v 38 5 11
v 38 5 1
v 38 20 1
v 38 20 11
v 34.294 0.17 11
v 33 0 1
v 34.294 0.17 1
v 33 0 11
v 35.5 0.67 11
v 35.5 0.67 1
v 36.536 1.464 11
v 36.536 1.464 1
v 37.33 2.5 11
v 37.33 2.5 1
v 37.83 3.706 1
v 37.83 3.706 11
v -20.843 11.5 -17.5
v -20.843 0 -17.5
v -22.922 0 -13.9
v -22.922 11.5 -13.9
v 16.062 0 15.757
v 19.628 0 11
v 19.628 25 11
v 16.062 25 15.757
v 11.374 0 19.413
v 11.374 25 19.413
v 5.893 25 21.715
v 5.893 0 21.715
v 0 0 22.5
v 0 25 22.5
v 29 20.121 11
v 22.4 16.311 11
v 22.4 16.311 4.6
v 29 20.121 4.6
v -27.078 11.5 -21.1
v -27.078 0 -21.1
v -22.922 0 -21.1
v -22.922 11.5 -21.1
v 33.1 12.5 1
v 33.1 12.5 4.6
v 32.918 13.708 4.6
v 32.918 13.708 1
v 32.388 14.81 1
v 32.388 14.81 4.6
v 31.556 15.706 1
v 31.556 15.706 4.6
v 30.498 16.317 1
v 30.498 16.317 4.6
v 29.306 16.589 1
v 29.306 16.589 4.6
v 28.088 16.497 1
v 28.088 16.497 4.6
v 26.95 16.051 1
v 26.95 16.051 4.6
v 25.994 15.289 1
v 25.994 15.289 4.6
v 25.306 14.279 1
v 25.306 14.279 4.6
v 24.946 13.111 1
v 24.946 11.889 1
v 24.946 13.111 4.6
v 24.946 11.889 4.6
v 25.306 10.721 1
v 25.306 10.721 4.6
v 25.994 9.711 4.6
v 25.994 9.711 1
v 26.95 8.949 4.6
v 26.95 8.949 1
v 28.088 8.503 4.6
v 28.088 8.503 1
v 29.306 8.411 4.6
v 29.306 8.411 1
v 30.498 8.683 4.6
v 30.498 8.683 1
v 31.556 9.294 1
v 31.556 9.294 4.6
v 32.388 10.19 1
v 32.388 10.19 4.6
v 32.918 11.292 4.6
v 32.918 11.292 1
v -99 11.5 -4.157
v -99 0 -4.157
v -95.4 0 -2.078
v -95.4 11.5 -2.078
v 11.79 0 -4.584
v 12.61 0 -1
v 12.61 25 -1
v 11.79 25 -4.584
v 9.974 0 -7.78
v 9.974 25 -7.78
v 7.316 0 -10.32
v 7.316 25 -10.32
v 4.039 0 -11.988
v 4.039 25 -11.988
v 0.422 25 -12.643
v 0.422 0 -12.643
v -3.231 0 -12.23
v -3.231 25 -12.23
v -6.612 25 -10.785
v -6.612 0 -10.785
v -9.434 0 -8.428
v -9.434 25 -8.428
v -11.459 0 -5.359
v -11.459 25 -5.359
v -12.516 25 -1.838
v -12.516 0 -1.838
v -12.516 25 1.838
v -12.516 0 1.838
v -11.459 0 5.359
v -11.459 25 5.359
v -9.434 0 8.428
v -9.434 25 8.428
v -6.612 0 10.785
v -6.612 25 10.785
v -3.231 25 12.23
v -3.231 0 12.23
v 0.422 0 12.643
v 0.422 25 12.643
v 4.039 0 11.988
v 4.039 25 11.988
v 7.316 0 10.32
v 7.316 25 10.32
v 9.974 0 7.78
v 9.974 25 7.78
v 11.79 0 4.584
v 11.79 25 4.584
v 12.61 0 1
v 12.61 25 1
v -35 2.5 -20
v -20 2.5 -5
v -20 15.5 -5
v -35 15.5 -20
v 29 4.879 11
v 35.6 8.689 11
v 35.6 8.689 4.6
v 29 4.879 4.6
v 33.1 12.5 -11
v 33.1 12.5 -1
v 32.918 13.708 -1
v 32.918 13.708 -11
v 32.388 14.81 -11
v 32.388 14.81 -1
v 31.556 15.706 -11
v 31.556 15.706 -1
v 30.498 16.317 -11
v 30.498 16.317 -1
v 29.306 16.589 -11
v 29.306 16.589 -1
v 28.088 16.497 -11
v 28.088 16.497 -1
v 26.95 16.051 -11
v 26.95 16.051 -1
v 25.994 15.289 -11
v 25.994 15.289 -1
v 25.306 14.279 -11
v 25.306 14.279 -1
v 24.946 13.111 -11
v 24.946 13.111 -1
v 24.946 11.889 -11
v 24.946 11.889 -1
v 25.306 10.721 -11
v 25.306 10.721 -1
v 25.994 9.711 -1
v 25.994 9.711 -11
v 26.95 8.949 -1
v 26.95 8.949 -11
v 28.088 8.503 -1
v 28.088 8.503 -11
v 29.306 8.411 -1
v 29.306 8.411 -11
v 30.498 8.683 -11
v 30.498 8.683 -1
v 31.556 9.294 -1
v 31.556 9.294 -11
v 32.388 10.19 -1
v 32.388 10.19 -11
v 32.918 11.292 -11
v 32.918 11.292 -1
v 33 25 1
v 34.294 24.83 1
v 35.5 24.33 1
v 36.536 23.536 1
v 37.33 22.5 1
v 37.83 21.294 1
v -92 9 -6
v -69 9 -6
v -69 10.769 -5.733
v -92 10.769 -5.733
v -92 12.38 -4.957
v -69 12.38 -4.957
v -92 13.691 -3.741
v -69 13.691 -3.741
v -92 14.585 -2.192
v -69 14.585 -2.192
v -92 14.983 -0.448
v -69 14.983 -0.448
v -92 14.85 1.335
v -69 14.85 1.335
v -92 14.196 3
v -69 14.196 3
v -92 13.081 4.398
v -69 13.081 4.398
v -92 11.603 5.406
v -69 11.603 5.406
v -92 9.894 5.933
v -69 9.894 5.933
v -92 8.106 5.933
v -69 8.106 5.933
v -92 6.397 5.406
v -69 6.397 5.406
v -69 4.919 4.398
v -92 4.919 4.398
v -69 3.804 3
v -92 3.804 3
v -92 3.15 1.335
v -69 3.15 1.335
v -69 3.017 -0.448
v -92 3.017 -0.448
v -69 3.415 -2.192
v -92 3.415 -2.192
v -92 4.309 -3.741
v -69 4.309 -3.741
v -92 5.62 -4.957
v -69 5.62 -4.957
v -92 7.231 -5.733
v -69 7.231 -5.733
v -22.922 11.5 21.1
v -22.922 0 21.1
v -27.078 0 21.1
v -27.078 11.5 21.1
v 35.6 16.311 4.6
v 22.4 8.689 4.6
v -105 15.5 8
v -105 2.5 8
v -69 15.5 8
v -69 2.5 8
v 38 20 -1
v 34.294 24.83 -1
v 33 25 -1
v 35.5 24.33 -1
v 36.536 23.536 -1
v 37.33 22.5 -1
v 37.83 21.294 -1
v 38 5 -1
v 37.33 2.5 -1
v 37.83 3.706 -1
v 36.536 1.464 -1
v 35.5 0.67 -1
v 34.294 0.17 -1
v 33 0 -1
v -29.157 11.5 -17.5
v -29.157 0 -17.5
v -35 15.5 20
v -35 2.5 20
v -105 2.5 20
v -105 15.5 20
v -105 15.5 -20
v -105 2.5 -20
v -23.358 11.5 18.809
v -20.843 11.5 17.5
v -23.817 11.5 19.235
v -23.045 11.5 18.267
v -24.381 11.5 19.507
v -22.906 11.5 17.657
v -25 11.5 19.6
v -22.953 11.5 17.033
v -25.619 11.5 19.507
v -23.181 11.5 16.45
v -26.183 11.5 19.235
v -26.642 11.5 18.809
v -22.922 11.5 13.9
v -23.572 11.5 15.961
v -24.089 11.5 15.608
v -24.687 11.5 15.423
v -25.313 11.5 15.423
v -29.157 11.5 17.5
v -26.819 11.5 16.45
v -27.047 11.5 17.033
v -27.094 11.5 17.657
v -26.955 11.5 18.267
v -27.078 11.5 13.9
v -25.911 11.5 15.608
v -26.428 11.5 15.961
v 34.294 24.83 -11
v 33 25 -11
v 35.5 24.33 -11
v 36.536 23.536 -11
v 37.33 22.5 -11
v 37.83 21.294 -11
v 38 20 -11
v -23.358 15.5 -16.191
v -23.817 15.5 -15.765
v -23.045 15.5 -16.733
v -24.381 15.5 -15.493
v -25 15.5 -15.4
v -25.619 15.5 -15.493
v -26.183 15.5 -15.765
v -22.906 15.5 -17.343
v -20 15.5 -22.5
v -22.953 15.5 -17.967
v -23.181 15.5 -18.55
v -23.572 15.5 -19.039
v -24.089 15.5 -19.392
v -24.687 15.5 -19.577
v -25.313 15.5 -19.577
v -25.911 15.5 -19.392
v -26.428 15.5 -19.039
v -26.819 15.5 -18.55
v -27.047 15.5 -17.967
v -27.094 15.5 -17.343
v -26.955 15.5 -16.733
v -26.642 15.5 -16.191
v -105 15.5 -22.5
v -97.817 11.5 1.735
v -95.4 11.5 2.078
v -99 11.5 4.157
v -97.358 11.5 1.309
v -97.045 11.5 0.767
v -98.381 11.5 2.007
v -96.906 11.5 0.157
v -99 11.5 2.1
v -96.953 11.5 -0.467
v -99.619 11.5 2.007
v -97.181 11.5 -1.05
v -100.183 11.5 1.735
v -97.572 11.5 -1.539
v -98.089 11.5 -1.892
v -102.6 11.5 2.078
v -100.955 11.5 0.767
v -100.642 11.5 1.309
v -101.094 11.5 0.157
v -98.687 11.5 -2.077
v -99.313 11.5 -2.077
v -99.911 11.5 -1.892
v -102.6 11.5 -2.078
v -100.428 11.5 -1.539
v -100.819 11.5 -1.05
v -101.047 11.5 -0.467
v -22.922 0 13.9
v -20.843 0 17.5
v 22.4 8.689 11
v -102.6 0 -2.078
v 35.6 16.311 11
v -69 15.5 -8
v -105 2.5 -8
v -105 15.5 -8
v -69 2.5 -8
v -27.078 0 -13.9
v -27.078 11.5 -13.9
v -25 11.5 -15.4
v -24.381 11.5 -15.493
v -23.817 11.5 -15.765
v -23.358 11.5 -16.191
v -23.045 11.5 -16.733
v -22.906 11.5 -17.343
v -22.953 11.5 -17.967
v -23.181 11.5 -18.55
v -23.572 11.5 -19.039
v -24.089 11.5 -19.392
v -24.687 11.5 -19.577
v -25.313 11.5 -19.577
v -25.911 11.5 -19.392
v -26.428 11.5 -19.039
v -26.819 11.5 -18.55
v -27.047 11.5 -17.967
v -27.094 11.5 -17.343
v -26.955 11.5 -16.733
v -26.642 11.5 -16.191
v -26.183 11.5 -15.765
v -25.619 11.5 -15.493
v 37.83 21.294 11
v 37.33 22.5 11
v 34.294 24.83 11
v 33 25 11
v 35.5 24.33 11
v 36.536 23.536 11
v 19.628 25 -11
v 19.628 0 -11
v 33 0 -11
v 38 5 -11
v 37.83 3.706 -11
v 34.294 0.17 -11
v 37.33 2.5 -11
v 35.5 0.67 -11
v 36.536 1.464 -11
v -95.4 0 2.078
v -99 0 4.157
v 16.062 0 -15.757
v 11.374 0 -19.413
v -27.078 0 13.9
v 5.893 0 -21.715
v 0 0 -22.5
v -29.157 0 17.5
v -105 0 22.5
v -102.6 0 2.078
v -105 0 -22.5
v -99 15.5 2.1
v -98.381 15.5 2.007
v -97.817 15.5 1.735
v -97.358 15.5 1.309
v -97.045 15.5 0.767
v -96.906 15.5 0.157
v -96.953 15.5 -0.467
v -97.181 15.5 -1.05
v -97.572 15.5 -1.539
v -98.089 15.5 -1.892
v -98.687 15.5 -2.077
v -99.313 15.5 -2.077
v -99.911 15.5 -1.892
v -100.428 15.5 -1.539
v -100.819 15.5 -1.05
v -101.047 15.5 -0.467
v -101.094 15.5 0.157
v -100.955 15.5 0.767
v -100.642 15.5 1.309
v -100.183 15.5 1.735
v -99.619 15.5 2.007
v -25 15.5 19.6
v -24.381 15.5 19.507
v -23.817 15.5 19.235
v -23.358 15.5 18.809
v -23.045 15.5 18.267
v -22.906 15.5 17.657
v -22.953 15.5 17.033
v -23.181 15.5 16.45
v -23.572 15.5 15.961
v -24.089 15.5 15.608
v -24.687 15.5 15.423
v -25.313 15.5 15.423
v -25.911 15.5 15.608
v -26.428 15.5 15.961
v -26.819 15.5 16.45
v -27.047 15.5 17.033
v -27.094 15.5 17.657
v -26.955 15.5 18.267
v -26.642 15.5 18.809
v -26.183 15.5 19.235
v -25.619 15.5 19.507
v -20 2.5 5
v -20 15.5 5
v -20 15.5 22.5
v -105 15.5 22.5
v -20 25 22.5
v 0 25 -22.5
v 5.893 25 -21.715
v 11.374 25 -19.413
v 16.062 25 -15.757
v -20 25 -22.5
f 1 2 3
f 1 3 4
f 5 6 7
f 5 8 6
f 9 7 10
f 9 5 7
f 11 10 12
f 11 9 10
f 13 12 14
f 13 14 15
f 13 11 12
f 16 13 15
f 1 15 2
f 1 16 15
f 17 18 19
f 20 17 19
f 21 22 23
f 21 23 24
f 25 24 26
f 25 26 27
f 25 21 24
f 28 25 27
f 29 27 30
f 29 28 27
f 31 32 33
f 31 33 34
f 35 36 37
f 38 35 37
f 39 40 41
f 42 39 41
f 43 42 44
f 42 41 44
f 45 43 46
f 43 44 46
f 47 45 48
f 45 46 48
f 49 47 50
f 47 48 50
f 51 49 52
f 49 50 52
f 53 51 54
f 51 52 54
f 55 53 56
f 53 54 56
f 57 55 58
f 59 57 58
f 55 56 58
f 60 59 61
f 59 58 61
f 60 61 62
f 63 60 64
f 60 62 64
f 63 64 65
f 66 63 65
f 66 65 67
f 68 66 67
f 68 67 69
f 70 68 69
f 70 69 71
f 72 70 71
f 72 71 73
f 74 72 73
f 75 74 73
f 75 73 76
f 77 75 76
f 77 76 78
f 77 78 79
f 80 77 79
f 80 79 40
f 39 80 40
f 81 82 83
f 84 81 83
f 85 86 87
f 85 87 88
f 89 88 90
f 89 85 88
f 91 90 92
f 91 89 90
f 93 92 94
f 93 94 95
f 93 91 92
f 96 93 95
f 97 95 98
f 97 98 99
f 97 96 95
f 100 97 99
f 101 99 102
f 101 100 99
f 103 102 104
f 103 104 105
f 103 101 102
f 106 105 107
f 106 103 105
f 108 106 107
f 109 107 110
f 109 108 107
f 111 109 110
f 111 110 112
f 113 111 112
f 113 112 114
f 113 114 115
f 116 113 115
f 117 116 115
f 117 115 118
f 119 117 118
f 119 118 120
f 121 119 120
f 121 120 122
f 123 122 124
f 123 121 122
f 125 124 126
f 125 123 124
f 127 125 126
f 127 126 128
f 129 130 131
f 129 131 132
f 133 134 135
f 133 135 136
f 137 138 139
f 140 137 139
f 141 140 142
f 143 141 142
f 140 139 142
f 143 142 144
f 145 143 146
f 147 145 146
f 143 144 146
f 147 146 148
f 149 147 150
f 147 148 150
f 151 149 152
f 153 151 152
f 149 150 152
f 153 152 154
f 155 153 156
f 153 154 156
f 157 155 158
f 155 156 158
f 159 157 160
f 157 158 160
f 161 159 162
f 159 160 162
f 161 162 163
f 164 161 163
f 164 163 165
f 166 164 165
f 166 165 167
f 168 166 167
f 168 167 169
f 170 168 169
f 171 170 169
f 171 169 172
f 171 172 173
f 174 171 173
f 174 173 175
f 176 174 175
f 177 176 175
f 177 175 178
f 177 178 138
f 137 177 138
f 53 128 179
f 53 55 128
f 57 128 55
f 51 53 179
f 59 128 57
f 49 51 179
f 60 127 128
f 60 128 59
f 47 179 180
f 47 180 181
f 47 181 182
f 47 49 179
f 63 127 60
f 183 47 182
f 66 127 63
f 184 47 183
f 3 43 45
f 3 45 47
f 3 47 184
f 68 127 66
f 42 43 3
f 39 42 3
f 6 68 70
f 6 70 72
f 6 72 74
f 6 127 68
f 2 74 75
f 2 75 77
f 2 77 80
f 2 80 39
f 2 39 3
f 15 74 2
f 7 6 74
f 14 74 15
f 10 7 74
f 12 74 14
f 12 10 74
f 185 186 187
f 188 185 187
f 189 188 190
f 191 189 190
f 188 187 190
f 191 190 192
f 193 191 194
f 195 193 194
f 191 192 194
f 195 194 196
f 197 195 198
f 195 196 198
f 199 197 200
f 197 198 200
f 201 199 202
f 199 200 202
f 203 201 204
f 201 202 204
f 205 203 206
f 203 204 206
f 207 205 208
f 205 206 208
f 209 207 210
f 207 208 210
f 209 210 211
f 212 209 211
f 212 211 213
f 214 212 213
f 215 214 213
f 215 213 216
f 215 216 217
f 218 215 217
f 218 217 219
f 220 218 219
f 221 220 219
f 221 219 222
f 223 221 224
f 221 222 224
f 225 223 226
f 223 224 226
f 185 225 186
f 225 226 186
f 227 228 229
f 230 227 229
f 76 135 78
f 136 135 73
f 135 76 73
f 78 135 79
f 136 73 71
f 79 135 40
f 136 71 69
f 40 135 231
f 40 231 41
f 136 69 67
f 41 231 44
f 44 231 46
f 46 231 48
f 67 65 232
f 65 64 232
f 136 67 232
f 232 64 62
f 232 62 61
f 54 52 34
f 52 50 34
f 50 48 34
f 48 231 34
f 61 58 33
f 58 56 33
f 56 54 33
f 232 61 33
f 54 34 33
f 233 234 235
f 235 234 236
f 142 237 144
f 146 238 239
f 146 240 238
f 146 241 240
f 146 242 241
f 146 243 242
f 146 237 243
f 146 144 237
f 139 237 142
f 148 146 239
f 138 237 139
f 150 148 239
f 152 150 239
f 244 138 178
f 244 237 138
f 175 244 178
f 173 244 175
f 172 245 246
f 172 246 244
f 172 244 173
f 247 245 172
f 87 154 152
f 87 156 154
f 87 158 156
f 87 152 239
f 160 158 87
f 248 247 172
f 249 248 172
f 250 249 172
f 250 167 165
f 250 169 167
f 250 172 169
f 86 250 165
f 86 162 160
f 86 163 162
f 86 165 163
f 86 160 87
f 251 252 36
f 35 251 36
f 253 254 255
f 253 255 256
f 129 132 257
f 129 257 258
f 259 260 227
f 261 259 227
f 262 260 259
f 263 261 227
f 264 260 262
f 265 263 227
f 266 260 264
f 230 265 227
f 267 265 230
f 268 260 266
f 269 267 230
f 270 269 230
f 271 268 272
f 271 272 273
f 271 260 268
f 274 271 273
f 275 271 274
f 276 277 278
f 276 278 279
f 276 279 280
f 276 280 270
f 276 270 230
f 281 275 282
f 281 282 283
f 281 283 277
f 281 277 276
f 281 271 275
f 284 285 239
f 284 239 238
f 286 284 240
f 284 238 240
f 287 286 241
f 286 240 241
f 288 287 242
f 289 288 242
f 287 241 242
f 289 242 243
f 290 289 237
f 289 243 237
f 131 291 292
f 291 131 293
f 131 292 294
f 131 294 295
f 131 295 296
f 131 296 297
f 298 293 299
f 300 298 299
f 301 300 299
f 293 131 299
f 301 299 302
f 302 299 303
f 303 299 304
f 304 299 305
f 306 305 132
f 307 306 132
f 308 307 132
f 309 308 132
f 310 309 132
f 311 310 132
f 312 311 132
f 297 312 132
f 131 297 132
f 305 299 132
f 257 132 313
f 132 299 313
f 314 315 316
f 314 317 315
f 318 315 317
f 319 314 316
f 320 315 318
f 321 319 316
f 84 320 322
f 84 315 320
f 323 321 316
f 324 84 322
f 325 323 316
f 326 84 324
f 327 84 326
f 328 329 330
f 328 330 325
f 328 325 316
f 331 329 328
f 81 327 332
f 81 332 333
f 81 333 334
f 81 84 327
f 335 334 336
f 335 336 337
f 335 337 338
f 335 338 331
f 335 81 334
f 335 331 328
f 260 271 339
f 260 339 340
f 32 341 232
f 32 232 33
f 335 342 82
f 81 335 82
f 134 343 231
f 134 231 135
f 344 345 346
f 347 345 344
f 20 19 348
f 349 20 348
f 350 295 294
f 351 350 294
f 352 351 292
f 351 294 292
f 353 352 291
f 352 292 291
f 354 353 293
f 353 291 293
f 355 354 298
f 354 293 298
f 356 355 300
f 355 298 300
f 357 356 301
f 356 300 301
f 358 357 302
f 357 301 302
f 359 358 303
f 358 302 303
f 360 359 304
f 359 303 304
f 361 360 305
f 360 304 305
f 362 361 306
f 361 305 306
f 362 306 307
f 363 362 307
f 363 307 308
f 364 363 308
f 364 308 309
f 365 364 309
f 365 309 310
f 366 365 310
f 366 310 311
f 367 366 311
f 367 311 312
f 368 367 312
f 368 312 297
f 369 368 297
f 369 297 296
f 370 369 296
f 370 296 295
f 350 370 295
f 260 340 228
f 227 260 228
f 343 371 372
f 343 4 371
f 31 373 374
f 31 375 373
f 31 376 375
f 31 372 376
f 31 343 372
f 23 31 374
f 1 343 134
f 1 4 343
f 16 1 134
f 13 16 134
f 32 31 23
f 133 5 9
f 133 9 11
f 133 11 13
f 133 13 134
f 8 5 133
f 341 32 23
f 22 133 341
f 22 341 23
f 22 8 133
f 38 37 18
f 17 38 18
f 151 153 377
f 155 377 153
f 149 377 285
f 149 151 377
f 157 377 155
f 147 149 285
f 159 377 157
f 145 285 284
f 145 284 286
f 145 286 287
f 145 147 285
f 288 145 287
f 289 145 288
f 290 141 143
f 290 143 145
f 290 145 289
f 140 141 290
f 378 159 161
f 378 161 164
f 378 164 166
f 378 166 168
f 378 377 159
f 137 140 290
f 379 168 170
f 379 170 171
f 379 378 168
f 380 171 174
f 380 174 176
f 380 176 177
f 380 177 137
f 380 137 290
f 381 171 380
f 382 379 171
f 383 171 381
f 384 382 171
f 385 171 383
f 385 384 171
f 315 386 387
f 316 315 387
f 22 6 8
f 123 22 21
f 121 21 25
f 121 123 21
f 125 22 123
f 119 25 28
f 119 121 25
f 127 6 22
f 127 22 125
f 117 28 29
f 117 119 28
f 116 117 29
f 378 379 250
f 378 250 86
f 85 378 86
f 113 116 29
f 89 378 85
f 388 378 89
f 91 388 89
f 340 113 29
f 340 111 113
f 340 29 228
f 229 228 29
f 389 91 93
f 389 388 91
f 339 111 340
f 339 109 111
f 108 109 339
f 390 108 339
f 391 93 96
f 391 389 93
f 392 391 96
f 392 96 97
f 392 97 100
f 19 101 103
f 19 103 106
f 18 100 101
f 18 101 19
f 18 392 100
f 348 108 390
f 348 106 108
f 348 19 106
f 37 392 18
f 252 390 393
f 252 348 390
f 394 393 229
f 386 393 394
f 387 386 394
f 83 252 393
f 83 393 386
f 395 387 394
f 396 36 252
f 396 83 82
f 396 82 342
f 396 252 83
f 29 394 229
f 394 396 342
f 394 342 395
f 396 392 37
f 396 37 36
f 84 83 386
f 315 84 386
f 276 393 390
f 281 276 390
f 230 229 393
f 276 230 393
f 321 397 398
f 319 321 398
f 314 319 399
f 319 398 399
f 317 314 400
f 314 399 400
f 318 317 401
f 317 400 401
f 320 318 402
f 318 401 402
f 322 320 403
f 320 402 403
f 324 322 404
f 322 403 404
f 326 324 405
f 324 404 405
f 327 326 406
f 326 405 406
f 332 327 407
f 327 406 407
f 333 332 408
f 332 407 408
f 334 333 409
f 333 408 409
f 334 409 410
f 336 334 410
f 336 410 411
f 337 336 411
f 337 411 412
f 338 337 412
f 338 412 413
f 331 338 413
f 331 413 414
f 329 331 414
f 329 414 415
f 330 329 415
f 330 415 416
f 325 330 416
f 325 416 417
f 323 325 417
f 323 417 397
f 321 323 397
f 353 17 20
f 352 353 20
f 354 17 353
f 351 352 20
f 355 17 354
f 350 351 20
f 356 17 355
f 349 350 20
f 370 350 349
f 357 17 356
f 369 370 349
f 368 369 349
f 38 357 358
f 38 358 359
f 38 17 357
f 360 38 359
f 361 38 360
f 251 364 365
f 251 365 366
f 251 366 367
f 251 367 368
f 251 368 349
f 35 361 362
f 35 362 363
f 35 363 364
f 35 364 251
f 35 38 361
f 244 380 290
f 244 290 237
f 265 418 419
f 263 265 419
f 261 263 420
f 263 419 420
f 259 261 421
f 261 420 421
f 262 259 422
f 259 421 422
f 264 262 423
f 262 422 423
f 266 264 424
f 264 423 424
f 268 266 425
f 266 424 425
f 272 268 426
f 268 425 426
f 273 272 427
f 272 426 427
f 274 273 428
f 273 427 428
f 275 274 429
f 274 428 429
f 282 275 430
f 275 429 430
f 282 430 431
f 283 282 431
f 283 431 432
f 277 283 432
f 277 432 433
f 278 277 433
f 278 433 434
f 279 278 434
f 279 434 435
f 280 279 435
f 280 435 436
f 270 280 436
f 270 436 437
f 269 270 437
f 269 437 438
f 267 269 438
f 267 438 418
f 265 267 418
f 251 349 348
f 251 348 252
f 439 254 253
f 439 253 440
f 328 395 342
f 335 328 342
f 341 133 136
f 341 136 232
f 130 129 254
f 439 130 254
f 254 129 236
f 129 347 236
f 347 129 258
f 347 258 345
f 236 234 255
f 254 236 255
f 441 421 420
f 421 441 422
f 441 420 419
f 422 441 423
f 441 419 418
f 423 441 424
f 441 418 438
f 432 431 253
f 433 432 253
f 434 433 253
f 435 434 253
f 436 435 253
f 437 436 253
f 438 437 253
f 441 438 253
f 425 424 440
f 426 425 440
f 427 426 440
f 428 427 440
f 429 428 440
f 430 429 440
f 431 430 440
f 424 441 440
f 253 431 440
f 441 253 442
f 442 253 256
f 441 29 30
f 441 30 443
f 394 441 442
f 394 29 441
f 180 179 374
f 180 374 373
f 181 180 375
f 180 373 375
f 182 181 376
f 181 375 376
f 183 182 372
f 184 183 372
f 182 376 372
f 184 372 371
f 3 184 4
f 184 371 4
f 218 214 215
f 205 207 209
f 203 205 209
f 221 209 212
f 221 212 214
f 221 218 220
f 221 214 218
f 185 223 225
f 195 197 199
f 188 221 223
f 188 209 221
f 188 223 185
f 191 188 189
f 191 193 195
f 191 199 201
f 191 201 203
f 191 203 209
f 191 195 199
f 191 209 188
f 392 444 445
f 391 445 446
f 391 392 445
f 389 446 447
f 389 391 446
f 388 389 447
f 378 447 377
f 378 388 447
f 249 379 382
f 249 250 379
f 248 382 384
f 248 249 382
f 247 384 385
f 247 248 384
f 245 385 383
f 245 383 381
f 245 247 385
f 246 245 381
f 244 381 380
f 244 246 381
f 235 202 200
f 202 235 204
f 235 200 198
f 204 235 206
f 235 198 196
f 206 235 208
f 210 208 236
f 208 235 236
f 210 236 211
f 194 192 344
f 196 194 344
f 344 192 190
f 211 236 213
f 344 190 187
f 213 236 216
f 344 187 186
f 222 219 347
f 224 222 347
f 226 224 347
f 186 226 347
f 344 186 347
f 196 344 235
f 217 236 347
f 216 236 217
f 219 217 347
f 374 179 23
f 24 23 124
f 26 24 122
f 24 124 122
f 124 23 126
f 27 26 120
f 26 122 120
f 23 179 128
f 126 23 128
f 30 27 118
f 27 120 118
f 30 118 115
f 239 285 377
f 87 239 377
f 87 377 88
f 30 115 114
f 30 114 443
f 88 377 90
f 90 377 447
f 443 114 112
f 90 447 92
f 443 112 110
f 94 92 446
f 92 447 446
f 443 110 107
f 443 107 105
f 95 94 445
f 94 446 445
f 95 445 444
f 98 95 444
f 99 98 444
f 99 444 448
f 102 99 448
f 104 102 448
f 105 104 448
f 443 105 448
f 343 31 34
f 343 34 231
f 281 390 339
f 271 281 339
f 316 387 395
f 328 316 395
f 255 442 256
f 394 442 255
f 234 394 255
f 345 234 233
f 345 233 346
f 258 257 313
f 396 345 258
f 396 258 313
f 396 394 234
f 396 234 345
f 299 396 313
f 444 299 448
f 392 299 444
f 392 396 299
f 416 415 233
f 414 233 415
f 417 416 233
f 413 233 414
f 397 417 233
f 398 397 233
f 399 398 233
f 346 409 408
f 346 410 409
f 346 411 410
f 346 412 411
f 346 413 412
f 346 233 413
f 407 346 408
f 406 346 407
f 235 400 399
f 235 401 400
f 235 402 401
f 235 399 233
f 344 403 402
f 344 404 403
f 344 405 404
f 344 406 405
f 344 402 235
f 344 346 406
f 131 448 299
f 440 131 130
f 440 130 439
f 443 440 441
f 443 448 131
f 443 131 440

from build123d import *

# Parameters (mm, degrees)
BOSS_EXTRUDE1_DEPTH = 25
CUT_EXTRUDE1_DEPTH  = 85
SKETCH3_W           = 36
SKETCH3_H           = 16
BOSS_EXTRUDE2_DEPTH = 13
SKETCH4_R           = 6
CUT_EXTRUDE2_DEPTH  = 23
BOSS_EXTRUDE3_DEPTH = 13
CUT_EXTRUDE4_REACH  = 110.497
SKETCH7_R           = 2.1
CUT_EXTRUDE5_DEPTH  = 11.5
SKETCH10_R          = 4.1
CUT_EXTRUDE6_DEPTH  = 114.014379616
SKETCH11_R          = 4.1
CUT_EXTRUDE7_DEPTH  = 6.4
FILLET1_R           = 5


with BuildPart() as part:
    # Sketch1 → Boss-Extrude1 (new body)
    with BuildSketch(Plane(origin=(0, 0, 0), x_dir=(1, 0, 0), z_dir=(0, 1, 0))):
        with BuildLine():
            Line((0, -22.5), (-105, -22.5))
            Line((-105, -22.5), (-105, 22.5))
            Line((-105, 22.5), (0, 22.5))
            ThreePointArc((0, 22.5), (11.374313166, 19.413268658), (19.627786426, 11))
            Line((19.627786426, 11), (38, 11))
            Line((38, 11), (38, 1))
            Line((38, 1), (22, 1))
            Line((22, 1), (12.610412364, 1))
            ThreePointArc((12.610412364, 1), (-12.65, 0), (12.610412364, -1))
            Line((12.610412364, -1), (22, -1))
            Line((22, -1), (38, -1))
            Line((38, -1), (38, -11))
            Line((38, -11), (19.627786426, -11))
            ThreePointArc((19.627786426, -11), (11.374313166, -19.413268658), (0, -22.5))
        make_face()
    extrude(amount=BOSS_EXTRUDE1_DEPTH)

    # Sketch2 → Cut-Extrude1 (cut)
    with BuildSketch(Plane.ZY.offset(105)):
        Polygon((20, 25), (-20, 25), (-22.5, 25), (-22.5, 15.5), (-20, 15.5), (-20, 2.5), (20, 2.5), (20, 15.5), (22.5, 15.5), (22.5, 25), align=None)
    extrude(amount=-CUT_EXTRUDE1_DEPTH, mode=Mode.SUBTRACT)

    # Sketch3 → Boss-Extrude2 (add)
    with BuildSketch(Plane(origin=(0, 2.5, 0), x_dir=(1, 0, 0), z_dir=(0, 1, 0))):
        with Locations((-87, 0)):
            Rectangle(SKETCH3_W, SKETCH3_H)
    extrude(amount=BOSS_EXTRUDE2_DEPTH)

    # Sketch4 → Cut-Extrude2 (cut)
    with BuildSketch(Plane(origin=(-69, 0, 0), x_dir=(0, 0, -1), z_dir=(1, 0, 0))):
        with Locations((0, 9)):
            Circle(SKETCH4_R)
    extrude(amount=-CUT_EXTRUDE2_DEPTH, mode=Mode.SUBTRACT)

    # Sketch6 → Boss-Extrude3 (add)
    with BuildSketch(Plane(origin=(0, 2.5, 0), x_dir=(1, 0, 0), z_dir=(0, 1, 0))):
        Polygon((-35, -20), (-20, -5), (-20, -20), align=None)
        Polygon((-20, 20), (-20, 5), (-35, 20), align=None)
    extrude(amount=BOSS_EXTRUDE3_DEPTH)

    # Sketch7 → Cut-Extrude4 (cut, up to next)
    with BuildSketch(Plane(origin=(0, 15.5, 0), x_dir=(1, 0, 0), z_dir=(0, 1, 0)), mode=Mode.PRIVATE) as cut_extrude4_sk1:
        with Locations(Location((-25, -17.5, 0), (0, 0, 270))):
            Circle(SKETCH7_R)
    cut_extrude4_tool1 = extrude(cut_extrude4_sk1.sketch, amount=-CUT_EXTRUDE4_REACH, mode=Mode.PRIVATE) & part.part
    # Sketch7 → Cut-Extrude4 (cut, up to next)
    with BuildSketch(Plane(origin=(0, 15.5, 0), x_dir=(1, 0, 0), z_dir=(0, 1, 0)), mode=Mode.PRIVATE) as cut_extrude4_sk2:
        with Locations(Location((-25, 17.5, 0), (0, 0, 270))):
            Circle(SKETCH7_R)
    cut_extrude4_tool2 = extrude(cut_extrude4_sk2.sketch, amount=-CUT_EXTRUDE4_REACH, mode=Mode.PRIVATE) & part.part
    # Sketch7 → Cut-Extrude4 (cut, up to next)
    with BuildSketch(Plane(origin=(0, 15.5, 0), x_dir=(1, 0, 0), z_dir=(0, 1, 0)), mode=Mode.PRIVATE) as cut_extrude4_sk3:
        with Locations(Location((-99, 0, 0), (0, 0, 270))):
            Circle(SKETCH7_R)
    cut_extrude4_tool3 = extrude(cut_extrude4_sk3.sketch, amount=-CUT_EXTRUDE4_REACH, mode=Mode.PRIVATE) & part.part
    add(cut_extrude4_tool1.solids().sort_by_distance((-25, 15.5, 17.5))[0], mode=Mode.SUBTRACT)
    add(cut_extrude4_tool2.solids().sort_by_distance((-25, 15.5, -17.5))[0], mode=Mode.SUBTRACT)
    add(cut_extrude4_tool3.solids().sort_by_distance((-99, 15.5, 0))[0], mode=Mode.SUBTRACT)

    # Sketch8 → Cut-Extrude5 (cut)
    with BuildSketch(Plane(origin=(0, 0, 0), x_dir=(-1, 0, 0), z_dir=(0, -1, 0))):
        Polygon((20.843078062, 17.5), (22.921539031, 13.9), (27.078460969, 13.9), (29.156921938, 17.5), (27.078460969, 21.1), (22.921539031, 21.1), align=None)
        Polygon((20.843078062, -17.5), (22.921539031, -21.1), (27.078460969, -21.1), (29.156921938, -17.5), (27.078460969, -13.9), (22.921539031, -13.9), align=None)
        Polygon((99, -4.156921938), (102.6, -2.078460969), (102.6, 2.078460969), (99, 4.156921938), (95.4, 2.078460969), (95.4, -2.078460969), align=None)
    extrude(amount=-CUT_EXTRUDE5_DEPTH, mode=Mode.SUBTRACT)

    # Sketch10 → Cut-Extrude6 (cut, through all)
    with BuildSketch(Plane.XY.offset(11)):
        with Locations((29, 12.5)):
            Circle(SKETCH10_R)
    extrude(amount=-CUT_EXTRUDE6_DEPTH, mode=Mode.SUBTRACT)

    # Sketch11 → Cut-Extrude7 (cut)
    with BuildSketch(Plane(origin=(0, 0, 11), x_dir=(-1, 0, 0), z_dir=(0, 0, -1))):
        Polygon((-35.6, 16.310511777), (-35.6, 8.689488223), (-29, 4.878976447), (-22.4, 8.689488223), (-22.4, 16.310511777), (-29, 20.121023553), align=None)
        with Locations(Location((-29, 12.5, 0), (0, 0, 180))):
            Circle(SKETCH11_R, mode=Mode.SUBTRACT)
    extrude(amount=CUT_EXTRUDE7_DEPTH, mode=Mode.SUBTRACT)

    # Fillet1
    fillet1_edges = [part.edges().sort_by_distance(p)[0] for p in [
        (38, 25, 6),
        (38, 0, -6),
        (38, 0, 6),
        (38, 25, -6),
    ]]
    fillet(fillet1_edges, radius=FILLET1_R)


solid = part.part
